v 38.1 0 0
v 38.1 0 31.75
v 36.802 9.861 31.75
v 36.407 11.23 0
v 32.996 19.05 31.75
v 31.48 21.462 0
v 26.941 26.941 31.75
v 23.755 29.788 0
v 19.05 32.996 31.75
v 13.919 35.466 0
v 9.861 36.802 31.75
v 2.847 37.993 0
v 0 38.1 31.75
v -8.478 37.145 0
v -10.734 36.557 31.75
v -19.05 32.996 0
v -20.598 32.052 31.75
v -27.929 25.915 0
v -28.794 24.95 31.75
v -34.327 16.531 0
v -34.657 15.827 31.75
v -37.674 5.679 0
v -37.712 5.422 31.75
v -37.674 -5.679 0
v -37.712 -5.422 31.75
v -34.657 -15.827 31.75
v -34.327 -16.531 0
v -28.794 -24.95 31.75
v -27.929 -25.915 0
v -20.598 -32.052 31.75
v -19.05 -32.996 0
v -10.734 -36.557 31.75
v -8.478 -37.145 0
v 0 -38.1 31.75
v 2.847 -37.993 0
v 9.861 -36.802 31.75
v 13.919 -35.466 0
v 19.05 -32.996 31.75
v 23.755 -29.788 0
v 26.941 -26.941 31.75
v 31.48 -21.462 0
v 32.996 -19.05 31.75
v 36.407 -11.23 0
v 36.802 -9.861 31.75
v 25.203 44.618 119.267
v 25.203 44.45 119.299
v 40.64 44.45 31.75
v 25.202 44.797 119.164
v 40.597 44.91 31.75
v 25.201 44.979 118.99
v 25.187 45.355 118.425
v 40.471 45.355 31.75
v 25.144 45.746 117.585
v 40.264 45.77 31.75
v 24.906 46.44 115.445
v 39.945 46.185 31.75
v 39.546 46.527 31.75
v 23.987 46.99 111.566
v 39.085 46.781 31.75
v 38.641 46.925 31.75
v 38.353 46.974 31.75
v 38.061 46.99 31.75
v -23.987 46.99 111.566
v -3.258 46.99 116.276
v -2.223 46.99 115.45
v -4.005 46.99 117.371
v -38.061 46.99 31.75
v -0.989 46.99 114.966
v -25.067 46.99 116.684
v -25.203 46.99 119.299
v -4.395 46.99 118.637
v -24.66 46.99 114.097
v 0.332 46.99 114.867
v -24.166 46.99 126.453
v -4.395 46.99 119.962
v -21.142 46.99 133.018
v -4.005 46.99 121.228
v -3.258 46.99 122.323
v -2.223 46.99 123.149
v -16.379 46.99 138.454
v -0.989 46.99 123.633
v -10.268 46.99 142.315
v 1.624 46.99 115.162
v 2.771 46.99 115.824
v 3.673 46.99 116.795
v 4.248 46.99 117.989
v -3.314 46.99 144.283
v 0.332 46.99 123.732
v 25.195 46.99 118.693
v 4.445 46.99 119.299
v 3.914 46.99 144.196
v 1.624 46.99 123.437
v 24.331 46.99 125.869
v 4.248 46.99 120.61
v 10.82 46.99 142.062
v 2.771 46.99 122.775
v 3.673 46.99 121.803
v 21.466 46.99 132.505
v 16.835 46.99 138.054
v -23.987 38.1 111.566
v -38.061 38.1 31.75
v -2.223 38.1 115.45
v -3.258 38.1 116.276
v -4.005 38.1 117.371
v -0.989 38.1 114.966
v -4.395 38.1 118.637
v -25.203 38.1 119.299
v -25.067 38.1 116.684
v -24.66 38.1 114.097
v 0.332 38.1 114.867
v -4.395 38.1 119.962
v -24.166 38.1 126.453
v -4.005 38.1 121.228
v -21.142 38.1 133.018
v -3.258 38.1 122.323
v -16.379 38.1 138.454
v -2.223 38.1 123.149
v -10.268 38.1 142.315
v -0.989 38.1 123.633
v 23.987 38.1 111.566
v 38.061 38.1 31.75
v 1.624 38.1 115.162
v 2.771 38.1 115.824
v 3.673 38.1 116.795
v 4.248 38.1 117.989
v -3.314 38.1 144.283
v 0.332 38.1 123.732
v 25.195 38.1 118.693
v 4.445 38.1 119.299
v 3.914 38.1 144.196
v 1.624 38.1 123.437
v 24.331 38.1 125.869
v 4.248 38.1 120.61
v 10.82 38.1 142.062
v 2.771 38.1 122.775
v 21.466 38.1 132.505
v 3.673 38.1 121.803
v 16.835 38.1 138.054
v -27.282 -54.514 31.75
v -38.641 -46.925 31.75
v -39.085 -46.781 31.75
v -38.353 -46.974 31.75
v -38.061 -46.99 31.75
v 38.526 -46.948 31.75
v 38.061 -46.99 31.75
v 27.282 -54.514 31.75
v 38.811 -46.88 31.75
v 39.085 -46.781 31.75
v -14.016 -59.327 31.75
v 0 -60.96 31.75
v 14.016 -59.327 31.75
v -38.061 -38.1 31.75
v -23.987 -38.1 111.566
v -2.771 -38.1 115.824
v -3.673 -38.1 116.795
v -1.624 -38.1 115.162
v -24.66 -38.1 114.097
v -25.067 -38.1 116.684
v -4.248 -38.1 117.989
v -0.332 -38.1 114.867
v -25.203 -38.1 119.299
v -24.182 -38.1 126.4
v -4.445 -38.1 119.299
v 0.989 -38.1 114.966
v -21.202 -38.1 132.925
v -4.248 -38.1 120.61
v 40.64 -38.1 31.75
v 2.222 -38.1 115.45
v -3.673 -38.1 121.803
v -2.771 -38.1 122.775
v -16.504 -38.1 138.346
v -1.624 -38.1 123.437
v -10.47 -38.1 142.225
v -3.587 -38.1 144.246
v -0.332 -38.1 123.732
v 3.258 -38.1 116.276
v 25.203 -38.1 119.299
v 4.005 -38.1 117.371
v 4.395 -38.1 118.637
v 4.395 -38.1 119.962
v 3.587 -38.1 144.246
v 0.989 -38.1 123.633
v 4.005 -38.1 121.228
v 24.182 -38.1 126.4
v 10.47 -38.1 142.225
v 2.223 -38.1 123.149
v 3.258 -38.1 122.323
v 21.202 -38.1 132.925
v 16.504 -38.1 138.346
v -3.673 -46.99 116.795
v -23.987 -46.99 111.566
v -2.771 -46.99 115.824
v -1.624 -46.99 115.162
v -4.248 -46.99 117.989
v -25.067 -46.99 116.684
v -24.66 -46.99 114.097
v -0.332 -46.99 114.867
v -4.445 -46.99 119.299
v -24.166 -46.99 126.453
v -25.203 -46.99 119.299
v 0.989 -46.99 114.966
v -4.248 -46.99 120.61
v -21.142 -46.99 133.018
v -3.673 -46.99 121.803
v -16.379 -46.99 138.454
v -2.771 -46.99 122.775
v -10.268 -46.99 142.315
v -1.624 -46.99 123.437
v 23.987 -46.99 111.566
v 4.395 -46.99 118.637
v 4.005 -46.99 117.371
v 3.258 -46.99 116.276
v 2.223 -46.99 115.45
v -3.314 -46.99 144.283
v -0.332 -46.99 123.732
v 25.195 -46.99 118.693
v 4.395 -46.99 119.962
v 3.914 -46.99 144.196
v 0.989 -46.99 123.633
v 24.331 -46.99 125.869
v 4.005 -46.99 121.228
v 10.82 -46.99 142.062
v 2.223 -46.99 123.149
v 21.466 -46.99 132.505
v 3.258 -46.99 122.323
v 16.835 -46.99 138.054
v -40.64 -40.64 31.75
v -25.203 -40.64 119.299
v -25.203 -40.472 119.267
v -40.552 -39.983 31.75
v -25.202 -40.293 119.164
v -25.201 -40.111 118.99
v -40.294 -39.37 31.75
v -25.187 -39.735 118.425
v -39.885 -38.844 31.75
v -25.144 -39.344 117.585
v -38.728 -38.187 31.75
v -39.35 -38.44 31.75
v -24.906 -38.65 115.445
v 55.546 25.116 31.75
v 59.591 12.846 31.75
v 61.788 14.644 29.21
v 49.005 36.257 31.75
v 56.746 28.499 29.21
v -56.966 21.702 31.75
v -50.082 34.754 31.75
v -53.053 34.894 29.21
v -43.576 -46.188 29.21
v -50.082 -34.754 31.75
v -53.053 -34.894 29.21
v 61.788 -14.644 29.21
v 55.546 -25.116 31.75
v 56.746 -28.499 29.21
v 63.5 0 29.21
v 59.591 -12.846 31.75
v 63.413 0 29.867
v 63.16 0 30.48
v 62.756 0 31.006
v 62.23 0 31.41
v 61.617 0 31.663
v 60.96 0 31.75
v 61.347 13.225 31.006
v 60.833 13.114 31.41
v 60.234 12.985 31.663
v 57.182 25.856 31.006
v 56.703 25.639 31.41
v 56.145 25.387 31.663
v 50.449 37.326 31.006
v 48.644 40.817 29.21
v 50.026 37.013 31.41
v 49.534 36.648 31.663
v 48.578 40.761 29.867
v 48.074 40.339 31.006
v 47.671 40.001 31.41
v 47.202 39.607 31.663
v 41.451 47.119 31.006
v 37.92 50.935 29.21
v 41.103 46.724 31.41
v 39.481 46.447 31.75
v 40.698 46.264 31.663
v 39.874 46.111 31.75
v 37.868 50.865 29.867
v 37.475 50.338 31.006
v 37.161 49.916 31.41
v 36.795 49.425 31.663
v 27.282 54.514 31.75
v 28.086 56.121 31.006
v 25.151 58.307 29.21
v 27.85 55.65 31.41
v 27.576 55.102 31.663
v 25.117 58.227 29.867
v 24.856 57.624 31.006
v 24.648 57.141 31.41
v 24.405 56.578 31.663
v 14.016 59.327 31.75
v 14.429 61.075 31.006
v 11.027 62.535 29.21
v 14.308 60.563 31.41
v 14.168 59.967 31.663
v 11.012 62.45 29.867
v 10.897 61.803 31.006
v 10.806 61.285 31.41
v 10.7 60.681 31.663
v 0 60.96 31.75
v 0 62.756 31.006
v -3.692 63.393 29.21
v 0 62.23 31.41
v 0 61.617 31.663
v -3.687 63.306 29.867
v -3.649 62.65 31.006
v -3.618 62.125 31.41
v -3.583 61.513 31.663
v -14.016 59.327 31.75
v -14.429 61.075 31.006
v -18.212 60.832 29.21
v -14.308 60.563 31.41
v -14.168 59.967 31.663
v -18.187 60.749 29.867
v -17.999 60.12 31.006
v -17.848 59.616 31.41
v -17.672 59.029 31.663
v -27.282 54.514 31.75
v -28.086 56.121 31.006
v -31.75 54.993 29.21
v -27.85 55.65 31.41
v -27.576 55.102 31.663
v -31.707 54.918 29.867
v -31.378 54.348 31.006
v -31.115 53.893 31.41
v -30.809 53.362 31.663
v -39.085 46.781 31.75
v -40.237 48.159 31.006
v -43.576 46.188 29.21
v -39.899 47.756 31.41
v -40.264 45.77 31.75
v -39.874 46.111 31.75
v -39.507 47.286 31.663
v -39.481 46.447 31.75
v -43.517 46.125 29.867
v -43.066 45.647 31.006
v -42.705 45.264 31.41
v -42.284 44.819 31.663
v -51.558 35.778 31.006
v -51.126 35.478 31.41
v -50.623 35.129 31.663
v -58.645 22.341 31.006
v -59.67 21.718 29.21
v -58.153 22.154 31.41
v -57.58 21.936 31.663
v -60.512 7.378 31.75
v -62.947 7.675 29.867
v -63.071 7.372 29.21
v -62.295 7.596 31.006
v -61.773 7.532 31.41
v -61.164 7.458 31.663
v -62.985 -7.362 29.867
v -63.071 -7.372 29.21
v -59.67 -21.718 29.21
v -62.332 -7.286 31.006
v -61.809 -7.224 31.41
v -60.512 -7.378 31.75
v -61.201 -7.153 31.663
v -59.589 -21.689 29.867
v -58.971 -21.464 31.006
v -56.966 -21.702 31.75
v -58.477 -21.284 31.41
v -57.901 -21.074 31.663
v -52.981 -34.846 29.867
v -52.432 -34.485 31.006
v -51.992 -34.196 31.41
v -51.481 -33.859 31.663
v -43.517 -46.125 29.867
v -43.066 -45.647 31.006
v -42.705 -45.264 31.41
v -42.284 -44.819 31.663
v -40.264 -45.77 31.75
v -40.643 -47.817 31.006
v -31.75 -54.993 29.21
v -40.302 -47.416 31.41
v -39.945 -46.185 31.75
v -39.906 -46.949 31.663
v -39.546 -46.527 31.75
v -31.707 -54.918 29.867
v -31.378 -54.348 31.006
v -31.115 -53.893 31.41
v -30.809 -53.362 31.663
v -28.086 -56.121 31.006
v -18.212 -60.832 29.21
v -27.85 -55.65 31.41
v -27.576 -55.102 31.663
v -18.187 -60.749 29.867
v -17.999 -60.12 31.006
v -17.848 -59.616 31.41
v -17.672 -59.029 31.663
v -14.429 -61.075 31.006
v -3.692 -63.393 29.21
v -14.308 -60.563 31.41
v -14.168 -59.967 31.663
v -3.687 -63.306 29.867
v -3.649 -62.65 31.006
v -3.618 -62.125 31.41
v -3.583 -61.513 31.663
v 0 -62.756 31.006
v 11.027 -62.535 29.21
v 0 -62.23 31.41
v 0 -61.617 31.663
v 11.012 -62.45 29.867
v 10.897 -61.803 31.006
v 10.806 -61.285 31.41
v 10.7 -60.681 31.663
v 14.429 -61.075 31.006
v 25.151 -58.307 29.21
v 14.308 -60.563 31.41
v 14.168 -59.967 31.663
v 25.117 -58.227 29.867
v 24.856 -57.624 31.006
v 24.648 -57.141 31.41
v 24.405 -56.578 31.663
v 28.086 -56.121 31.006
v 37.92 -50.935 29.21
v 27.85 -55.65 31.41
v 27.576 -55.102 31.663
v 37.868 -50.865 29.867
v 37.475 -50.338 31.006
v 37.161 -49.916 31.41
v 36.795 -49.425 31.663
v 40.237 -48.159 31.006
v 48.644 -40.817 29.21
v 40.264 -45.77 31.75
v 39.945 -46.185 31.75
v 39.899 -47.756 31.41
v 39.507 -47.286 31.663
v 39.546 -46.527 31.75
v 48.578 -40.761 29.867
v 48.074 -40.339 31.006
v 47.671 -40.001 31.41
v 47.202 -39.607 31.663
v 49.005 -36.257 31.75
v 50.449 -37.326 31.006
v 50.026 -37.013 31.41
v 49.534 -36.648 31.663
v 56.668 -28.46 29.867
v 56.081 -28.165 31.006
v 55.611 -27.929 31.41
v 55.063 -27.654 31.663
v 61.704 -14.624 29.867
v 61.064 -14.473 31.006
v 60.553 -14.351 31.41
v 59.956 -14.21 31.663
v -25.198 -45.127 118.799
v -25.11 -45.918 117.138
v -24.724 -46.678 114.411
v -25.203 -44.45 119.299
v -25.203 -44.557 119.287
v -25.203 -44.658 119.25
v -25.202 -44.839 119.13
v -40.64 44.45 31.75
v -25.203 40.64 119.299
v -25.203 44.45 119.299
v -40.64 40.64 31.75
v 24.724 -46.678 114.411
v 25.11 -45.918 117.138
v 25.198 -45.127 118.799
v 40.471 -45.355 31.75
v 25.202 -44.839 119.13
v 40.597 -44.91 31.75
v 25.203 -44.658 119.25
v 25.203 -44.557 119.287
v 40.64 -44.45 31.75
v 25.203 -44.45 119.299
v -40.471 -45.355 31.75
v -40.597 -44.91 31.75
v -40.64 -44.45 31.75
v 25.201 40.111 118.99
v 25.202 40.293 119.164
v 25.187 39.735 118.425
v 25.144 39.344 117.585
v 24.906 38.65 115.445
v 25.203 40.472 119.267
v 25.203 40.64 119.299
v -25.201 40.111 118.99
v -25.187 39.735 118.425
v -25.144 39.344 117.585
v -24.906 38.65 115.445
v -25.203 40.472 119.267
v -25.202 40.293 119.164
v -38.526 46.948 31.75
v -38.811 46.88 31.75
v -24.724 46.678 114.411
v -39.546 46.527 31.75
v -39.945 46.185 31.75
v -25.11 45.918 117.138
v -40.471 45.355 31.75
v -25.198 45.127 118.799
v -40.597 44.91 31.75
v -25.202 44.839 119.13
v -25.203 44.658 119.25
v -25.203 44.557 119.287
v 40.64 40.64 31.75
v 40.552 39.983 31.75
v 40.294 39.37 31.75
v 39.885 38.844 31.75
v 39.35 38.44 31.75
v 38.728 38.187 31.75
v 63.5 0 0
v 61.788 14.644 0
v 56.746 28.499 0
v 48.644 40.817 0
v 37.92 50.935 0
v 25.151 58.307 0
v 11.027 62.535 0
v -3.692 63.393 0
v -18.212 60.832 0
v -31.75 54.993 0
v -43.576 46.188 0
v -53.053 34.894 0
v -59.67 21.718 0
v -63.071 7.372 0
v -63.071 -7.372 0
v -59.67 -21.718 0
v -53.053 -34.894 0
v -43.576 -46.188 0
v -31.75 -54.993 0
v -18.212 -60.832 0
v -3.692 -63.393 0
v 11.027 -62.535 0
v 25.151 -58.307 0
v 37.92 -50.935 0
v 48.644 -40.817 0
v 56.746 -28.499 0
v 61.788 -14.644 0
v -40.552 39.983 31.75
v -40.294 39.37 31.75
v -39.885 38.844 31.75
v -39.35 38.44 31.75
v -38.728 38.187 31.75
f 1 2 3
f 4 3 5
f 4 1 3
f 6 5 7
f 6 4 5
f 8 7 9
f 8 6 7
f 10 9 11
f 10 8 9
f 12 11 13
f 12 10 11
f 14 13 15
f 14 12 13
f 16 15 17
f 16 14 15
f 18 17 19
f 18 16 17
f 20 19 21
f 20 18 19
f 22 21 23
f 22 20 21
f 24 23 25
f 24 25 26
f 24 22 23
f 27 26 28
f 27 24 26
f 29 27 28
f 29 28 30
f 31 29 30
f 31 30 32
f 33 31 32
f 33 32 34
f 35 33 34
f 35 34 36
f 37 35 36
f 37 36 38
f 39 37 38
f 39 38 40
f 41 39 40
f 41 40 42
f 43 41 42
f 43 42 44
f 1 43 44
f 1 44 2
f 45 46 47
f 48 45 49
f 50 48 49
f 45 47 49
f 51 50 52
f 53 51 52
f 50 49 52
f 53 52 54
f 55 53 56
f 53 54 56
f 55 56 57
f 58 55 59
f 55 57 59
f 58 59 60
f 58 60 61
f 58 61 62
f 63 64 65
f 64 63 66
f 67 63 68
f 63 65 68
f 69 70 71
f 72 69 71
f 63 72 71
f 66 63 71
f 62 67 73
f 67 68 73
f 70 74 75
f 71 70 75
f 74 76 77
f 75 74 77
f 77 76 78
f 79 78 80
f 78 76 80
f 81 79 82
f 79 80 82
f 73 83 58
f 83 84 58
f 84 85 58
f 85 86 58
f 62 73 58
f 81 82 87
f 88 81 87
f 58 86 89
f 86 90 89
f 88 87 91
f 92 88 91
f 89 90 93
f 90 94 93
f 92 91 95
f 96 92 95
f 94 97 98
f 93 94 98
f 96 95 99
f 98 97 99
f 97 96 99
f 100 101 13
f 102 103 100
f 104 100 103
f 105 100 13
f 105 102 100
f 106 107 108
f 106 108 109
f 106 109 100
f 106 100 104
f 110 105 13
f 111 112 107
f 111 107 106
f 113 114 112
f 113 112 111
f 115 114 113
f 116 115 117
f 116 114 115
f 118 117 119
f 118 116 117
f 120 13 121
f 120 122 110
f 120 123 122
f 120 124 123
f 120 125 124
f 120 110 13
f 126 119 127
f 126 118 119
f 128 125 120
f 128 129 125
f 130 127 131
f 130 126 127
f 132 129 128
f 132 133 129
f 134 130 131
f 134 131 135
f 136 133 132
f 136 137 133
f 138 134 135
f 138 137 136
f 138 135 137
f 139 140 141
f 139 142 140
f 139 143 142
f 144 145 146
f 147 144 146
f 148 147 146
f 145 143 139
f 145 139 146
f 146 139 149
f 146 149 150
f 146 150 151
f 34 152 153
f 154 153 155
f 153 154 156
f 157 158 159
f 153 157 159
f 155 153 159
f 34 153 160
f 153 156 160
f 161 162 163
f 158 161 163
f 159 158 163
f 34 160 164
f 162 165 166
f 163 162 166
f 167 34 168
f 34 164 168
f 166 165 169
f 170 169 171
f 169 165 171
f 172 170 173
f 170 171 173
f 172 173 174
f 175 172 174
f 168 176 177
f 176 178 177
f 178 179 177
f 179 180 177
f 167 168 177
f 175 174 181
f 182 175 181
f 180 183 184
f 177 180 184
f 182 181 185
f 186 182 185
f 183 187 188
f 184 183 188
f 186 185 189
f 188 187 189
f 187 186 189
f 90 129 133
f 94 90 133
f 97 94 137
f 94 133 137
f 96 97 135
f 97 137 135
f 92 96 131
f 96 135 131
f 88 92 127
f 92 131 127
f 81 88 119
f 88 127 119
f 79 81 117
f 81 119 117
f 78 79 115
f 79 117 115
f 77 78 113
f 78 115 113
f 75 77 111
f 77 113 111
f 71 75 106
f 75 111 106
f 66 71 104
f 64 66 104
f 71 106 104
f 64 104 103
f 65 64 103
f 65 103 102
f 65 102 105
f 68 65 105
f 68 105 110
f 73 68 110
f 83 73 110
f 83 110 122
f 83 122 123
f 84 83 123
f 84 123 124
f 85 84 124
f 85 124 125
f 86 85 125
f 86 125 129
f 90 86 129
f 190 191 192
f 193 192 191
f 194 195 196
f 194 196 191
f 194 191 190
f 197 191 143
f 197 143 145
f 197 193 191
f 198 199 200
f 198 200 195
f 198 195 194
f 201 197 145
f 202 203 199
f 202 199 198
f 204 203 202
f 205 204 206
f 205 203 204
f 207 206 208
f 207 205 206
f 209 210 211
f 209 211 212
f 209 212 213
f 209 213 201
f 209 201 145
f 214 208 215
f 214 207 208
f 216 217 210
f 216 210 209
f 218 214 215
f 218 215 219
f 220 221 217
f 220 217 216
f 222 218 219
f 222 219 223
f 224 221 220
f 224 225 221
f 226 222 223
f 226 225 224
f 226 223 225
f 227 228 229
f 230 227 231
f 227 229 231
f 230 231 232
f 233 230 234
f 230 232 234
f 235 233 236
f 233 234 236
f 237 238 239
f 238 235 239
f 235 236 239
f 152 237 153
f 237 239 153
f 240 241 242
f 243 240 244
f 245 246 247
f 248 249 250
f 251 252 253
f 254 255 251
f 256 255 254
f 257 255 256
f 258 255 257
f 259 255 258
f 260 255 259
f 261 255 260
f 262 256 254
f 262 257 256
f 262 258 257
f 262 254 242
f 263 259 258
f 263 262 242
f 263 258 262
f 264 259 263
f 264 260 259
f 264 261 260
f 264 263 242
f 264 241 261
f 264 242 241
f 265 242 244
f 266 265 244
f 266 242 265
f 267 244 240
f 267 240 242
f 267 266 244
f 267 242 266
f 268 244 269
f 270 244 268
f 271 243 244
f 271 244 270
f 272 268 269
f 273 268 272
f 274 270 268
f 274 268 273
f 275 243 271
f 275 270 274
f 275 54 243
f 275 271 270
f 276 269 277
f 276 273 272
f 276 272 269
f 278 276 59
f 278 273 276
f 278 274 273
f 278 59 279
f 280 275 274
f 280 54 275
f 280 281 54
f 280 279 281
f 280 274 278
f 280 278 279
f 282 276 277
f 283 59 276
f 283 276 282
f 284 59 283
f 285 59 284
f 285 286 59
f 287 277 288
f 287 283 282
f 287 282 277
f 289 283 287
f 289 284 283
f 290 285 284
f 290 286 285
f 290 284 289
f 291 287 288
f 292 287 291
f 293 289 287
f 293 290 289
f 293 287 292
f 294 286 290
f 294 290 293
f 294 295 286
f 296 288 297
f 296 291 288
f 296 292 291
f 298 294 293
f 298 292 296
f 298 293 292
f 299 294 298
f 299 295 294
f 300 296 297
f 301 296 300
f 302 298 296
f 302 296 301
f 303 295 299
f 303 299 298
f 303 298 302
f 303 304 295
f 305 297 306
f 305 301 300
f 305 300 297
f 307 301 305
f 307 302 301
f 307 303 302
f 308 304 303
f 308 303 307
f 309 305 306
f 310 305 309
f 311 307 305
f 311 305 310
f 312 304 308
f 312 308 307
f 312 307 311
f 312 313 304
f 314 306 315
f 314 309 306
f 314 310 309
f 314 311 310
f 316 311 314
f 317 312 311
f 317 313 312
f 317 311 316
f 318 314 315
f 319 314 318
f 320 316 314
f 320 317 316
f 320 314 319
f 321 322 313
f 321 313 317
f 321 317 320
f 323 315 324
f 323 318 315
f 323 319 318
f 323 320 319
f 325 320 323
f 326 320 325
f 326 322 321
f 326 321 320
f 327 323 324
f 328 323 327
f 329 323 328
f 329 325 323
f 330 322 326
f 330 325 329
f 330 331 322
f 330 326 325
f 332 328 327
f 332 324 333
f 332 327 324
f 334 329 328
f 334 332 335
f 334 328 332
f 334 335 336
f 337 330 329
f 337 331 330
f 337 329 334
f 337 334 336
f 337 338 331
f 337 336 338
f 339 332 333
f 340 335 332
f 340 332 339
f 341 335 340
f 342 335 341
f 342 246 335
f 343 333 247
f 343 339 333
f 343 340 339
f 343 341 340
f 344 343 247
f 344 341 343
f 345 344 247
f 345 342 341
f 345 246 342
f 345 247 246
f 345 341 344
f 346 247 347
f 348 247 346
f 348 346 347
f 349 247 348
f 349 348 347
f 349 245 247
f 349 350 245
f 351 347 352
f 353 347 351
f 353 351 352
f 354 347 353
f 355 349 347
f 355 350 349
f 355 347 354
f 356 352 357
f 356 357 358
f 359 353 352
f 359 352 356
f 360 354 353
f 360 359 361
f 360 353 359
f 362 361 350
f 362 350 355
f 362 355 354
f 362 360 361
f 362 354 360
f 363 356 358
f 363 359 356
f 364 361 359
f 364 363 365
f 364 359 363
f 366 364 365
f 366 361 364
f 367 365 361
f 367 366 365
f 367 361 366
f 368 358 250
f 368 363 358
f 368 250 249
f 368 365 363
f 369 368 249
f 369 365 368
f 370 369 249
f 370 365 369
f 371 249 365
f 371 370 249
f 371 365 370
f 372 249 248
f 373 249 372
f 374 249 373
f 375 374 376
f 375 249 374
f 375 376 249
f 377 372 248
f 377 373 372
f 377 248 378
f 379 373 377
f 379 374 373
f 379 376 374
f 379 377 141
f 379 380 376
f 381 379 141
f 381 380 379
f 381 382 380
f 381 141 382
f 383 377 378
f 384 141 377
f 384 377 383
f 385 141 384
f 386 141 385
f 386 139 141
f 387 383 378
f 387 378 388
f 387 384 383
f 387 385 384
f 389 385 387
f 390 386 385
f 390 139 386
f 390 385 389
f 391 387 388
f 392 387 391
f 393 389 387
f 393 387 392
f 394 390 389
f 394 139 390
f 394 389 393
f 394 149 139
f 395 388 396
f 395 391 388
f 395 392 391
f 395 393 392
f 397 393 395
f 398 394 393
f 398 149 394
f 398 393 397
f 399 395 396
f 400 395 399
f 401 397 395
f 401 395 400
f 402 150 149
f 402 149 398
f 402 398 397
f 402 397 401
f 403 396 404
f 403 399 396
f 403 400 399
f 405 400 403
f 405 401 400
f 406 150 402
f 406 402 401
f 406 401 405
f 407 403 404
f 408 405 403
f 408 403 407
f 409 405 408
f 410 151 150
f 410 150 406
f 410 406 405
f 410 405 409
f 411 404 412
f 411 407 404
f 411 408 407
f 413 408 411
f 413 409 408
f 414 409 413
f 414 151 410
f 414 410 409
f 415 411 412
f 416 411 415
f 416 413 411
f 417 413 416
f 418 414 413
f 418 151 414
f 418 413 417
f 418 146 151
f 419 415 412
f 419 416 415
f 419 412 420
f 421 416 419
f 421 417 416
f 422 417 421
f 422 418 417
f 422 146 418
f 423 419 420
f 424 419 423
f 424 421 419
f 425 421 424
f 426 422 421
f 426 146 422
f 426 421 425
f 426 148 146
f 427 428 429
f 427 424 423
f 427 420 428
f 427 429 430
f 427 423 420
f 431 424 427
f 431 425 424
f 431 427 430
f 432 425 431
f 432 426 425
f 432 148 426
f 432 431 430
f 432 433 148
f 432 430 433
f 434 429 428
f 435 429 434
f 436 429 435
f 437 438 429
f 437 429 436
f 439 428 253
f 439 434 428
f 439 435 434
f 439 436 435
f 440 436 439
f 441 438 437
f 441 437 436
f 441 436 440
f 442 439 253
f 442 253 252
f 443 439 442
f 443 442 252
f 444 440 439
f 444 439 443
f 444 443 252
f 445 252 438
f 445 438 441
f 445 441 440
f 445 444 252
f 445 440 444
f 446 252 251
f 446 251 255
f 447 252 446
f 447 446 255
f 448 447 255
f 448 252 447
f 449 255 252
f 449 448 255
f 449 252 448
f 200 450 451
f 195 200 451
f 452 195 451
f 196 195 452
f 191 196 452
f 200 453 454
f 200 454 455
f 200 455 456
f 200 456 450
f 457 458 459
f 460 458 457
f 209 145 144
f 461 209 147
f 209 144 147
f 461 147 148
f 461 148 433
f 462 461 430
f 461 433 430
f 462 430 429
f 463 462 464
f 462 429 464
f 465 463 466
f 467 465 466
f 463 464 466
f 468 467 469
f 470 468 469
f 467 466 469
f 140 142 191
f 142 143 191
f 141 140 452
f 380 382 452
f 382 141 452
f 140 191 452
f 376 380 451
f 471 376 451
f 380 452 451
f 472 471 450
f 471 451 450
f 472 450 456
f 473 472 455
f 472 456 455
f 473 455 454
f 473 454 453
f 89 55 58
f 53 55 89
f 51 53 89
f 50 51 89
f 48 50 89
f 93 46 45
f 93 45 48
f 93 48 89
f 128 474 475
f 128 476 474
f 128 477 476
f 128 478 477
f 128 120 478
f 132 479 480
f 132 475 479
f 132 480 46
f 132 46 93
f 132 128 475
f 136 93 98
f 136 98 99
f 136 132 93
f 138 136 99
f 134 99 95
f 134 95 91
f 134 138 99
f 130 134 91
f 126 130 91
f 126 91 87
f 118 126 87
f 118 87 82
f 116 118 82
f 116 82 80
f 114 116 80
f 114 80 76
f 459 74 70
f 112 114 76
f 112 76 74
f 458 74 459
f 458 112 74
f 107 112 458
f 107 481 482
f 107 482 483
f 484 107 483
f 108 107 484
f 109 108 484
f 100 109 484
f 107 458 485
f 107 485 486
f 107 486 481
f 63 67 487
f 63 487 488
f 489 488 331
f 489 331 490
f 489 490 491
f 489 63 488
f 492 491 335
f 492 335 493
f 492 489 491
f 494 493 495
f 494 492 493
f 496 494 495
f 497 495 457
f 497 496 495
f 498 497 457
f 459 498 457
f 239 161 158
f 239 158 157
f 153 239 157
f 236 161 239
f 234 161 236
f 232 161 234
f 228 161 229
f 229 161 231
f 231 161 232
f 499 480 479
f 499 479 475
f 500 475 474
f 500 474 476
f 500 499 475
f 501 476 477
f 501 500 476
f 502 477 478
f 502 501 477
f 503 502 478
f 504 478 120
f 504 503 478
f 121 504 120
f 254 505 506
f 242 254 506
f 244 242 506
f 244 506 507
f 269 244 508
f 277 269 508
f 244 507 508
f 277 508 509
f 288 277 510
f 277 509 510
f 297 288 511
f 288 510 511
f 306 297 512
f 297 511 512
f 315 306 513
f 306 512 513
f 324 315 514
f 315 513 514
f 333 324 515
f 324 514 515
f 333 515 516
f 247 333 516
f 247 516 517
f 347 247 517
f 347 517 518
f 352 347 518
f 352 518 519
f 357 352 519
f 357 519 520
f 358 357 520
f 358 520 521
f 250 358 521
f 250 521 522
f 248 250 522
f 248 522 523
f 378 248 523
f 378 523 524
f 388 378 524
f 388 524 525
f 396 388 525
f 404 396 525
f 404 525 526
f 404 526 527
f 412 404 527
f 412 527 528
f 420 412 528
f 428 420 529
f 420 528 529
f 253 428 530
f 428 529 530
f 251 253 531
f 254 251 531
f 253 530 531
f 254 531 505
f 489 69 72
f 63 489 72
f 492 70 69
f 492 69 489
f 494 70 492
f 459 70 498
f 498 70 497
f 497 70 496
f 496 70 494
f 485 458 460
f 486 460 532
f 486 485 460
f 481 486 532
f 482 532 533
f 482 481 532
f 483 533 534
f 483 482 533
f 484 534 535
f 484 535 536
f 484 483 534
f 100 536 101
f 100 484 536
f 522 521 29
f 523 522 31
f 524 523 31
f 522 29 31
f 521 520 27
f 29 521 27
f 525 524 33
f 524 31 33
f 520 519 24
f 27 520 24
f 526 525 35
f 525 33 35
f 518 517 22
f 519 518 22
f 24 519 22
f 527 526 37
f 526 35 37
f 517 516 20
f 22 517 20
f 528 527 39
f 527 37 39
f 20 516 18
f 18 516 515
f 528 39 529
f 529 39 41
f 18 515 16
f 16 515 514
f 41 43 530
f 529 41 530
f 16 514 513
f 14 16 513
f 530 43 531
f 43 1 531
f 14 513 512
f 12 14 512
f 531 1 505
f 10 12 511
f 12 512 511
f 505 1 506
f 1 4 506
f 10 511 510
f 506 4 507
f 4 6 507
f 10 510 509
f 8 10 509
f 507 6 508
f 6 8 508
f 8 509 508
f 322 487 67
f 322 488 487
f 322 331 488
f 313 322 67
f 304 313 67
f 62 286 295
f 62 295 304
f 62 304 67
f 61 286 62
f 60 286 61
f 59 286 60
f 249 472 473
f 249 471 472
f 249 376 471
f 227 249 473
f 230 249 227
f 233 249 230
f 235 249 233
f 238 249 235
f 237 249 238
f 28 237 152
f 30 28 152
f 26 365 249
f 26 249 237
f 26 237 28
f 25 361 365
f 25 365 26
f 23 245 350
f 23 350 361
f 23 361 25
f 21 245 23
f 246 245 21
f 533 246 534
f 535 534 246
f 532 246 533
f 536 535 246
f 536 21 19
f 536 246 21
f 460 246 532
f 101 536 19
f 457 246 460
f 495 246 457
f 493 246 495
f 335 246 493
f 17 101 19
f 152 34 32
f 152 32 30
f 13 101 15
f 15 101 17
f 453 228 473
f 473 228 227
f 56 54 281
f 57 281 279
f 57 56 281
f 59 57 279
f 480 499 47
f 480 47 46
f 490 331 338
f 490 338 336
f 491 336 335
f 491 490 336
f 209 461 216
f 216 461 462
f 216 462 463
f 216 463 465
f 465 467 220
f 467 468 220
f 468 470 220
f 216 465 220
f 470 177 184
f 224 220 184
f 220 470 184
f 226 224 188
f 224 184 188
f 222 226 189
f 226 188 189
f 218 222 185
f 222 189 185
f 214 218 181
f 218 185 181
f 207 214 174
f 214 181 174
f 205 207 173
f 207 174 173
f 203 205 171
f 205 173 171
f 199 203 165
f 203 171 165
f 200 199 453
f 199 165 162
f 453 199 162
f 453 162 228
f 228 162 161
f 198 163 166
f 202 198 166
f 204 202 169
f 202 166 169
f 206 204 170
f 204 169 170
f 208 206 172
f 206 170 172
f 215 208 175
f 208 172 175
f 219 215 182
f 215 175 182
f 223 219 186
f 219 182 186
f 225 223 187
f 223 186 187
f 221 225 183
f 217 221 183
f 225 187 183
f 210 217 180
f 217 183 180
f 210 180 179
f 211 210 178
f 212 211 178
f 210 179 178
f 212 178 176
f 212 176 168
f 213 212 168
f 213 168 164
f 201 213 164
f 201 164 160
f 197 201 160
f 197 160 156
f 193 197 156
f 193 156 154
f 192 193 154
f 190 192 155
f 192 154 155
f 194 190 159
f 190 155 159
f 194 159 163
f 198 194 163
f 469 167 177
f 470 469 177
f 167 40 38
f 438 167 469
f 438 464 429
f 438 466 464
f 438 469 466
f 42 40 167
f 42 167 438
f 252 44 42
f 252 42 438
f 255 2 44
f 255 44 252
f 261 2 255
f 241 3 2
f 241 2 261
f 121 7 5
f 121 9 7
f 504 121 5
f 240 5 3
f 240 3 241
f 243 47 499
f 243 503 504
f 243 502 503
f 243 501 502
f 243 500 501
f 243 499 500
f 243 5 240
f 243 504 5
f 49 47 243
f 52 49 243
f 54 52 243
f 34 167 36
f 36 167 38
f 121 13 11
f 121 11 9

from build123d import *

# Parameters (mm, degrees)
F0_R          = 63.5
F0_R_2        = 38.1
F1_DEPTH      = 31.75
F4_DEPTH      = 8.89
F9_D          = 8.89
F11_DEPTH     = 8.89
F13_D         = 8.89
F14_T4_DEPTH  = 114.3
F14_S6_R      = 25.2026770054
F14_T7_DEPTH  = 59
F14_T11_DEPTH = 114.3
F14_S13_R     = 25.2026770054
F14_T14_DEPTH = 59
F14_T18_DEPTH = 114.3
F14_S20_R     = 25.2026770054
F14_T21_DEPTH = 59
F14_T25_DEPTH = 114.3
F14_S27_R     = 25.2026770054
F14_T28_DEPTH = 59
F14_T32_DEPTH = 114.3
F14_S34_R     = 25.2026770054
F14_T35_DEPTH = 59
F14_T39_DEPTH = 114.3
F14_S41_R     = 25.2026770054
F14_T42_DEPTH = 59
F14_T46_DEPTH = 114.3
F14_S48_R     = 25.2026770054
F14_T49_DEPTH = 59
F14_S54_R     = 2.54
F14_T55_DEPTH = 99
F14_S56_R     = 2.54
F14_T57_DEPTH = 99


# Not quite as in the source:
# - a fillet or chamfer that OpenCascade refuses, or shapes differently, is made with other operations: its cross-section is extruded or revolved along the edge and cut away or added
# - a feature of the source that left no trace in its solid (it failed there, or was rolled back) is left out


with BuildPart() as f1:
    # F0 (on Top) → F1 (new body)
    with BuildSketch(Plane.XY):
        Circle(F0_R)
        Circle(F0_R_2, mode=Mode.SUBTRACT)
    extrude(amount=F1_DEPTH)

    # F3 (on offset) → F4 (join)
    with BuildSketch(Plane.XZ.offset(38.1)):
        with BuildLine():
            Line((-25.2026770054, 119.2994092428), (-40.64, 31.75))
            Line((-40.64, 31.75), (40.64, 31.75))
            Line((40.64, 31.75), (25.2026770054, 119.2994092428))
            ThreePointArc((25.2026770054, 119.2994092428), (0, 144.5020862482), (-25.2026770054, 119.2994092428))
        make_face()
    extrude(amount=F4_DEPTH)

    # F9 (through all)
    with Locations(Plane.XZ.offset(46.99)):
        with Locations((0, 119.2994092428)):
            Hole(F9_D / 2)

    # F6 (on offset) → F11 (join)
    with BuildSketch(Plane.XZ.offset(-38.1)):
        with BuildLine():
            Line((-25.2026770054, 119.2994092428), (-40.64, 31.75))
            Line((-40.64, 31.75), (40.64, 31.75))
            Line((40.64, 31.75), (25.2026770054, 119.2994092428))
            ThreePointArc((25.2026770054, 119.2994092428), (0, 144.5020862482), (-25.2026770054, 119.2994092428))
        make_face()
    extrude(amount=-F11_DEPTH)

    # F13 (through all)
    with Locations(Plane(origin=(0, 46.99, 0), x_dir=(-1, 0, 0), z_dir=(0, 1, 0))):
        with Locations((0, 119.2994092428)):
            Hole(F13_D / 2)

    # F14: fillet of radius 2.54 on 8 edges, made by hand


with BuildPart() as f14_tool2:
    # F14_s3 → F14_t4 (new body)
    with BuildSketch(Plane(origin=(22.9494446088, 0, 130.1527679803), x_dir=(0, 1, 0), z_dir=(-0.1736481777, 0, -0.984807753))):
        with BuildLine():
            ThreePointArc((-46.99, -42.9959167233), (-46.2460512242, -44.7919679476), (-44.45, -45.5359167233))
            Line((-44.45, -45.5359167233), (-46.99, -45.5359167233))
            Line((-46.99, -45.5359167233), (-46.99, -42.9959167233))
        make_face()
    extrude(amount=F14_T4_DEPTH)

    split(bisect_by=Plane.XY.offset(31.75), keep=Keep.TOP)

    # F14_s6 → F14_t7 (cut, symmetric)
    with BuildSketch(Plane.XZ.offset(45.7)):
        with Locations((0, 119.2994092428)):
            Circle(F14_S6_R)
    extrude(amount=F14_T7_DEPTH, both=True, mode=Mode.SUBTRACT)


with BuildPart() as f1_1:
    add(f1.part)

    # F14_t1: cut F14_tool2
    add(f14_tool2.part, mode=Mode.SUBTRACT)


with BuildPart() as f14_tool9:
    # F14_s10 → F14_t11 (new body)
    with BuildSketch(Plane(origin=(-3.1014579015, 0, 17.589241811), x_dir=(0, 1, 0), z_dir=(-0.1736481777, 0, 0.984807753))):
        with BuildLine():
            ThreePointArc((-46.99, -42.9959167233), (-46.2460512242, -44.7919679476), (-44.45, -45.5359167233))
            Line((-44.45, -45.5359167233), (-46.99, -45.5359167233))
            Line((-46.99, -45.5359167233), (-46.99, -42.9959167233))
        make_face()
    extrude(amount=F14_T11_DEPTH)

    split(bisect_by=Plane.XY.offset(31.75), keep=Keep.TOP)

    # F14_s13 → F14_t14 (cut, symmetric)
    with BuildSketch(Plane.XZ.offset(45.7)):
        with Locations((0, 119.2994092428)):
            Circle(F14_S13_R)
    extrude(amount=F14_T14_DEPTH, both=True, mode=Mode.SUBTRACT)


with BuildPart() as f1_2:
    add(f1_1.part)

    # F14_t8: cut F14_tool9
    add(f14_tool9.part, mode=Mode.SUBTRACT)


with BuildPart() as f14_tool16:
    # F14_s17 → F14_t18 (new body)
    with BuildSketch(Plane(origin=(22.9494446088, 0, 130.1527679803), x_dir=(0, 1, 0), z_dir=(-0.1736481777, 0, -0.984807753))):
        with BuildLine():
            ThreePointArc((-40.64, -45.5359167233), (-38.8439487758, -44.7919679476), (-38.1, -42.9959167233))
            Line((-38.1, -42.9959167233), (-38.1, -45.5359167233))
            Line((-38.1, -45.5359167233), (-40.64, -45.5359167233))
        make_face()
    extrude(amount=F14_T18_DEPTH)

    split(bisect_by=Plane.XY.offset(31.75), keep=Keep.TOP)

    # F14_s20 → F14_t21 (cut, symmetric)
    with BuildSketch(Plane.XZ.offset(39.4)):
        with Locations((0, 119.2994092428)):
            Circle(F14_S20_R)
    extrude(amount=F14_T21_DEPTH, both=True, mode=Mode.SUBTRACT)


with BuildPart() as f1_3:
    add(f1_2.part)

    # F14_t15: cut F14_tool16
    add(f14_tool16.part, mode=Mode.SUBTRACT)


with BuildPart() as f14_tool23:
    # F14_s24 → F14_t25 (new body)
    with BuildSketch(Plane(origin=(-3.1014579015, 0, 17.589241811), x_dir=(0, 1, 0), z_dir=(-0.1736481777, 0, 0.984807753))):
        with BuildLine():
            ThreePointArc((40.64, -45.5359167233), (38.8439487758, -44.7919679476), (38.1, -42.9959167233))
            Line((38.1, -42.9959167233), (38.1, -45.5359167233))
            Line((38.1, -45.5359167233), (40.64, -45.5359167233))
        make_face()
    extrude(amount=F14_T25_DEPTH)

    split(bisect_by=Plane.XY.offset(31.75), keep=Keep.TOP)

    # F14_s27 → F14_t28 (cut, symmetric)
    with BuildSketch(Plane.XZ.offset(-39.4)):
        with Locations((0, 119.2994092428)):
            Circle(F14_S27_R)
    extrude(amount=F14_T28_DEPTH, both=True, mode=Mode.SUBTRACT)


with BuildPart() as f1_4:
    add(f1_3.part)

    # F14_t22: cut F14_tool23
    add(f14_tool23.part, mode=Mode.SUBTRACT)


with BuildPart() as f14_tool30:
    # F14_s31 → F14_t32 (new body)
    with BuildSketch(Plane(origin=(-3.1014579015, 0, 17.589241811), x_dir=(0, 1, 0), z_dir=(-0.1736481777, 0, 0.984807753))):
        with BuildLine():
            ThreePointArc((44.45, -45.5359167233), (46.2460512242, -44.7919679476), (46.99, -42.9959167233))
            Line((46.99, -42.9959167233), (46.99, -45.5359167233))
            Line((46.99, -45.5359167233), (44.45, -45.5359167233))
        make_face()
    extrude(amount=F14_T32_DEPTH)

    split(bisect_by=Plane.XY.offset(31.75), keep=Keep.TOP)

    # F14_s34 → F14_t35 (cut, symmetric)
    with BuildSketch(Plane.XZ.offset(-45.7)):
        with Locations((0, 119.2994092428)):
            Circle(F14_S34_R)
    extrude(amount=F14_T35_DEPTH, both=True, mode=Mode.SUBTRACT)


with BuildPart() as f1_5:
    add(f1_4.part)

    # F14_t29: cut F14_tool30
    add(f14_tool30.part, mode=Mode.SUBTRACT)


with BuildPart() as f14_tool37:
    # F14_s38 → F14_t39 (new body)
    with BuildSketch(Plane(origin=(22.9494446088, 0, 130.1527679803), x_dir=(0, 1, 0), z_dir=(-0.1736481777, 0, -0.984807753))):
        with BuildLine():
            ThreePointArc((46.99, -42.9959167233), (46.2460512242, -44.7919679476), (44.45, -45.5359167233))
            Line((44.45, -45.5359167233), (46.99, -45.5359167233))
            Line((46.99, -45.5359167233), (46.99, -42.9959167233))
        make_face()
    extrude(amount=F14_T39_DEPTH)

    split(bisect_by=Plane.XY.offset(31.75), keep=Keep.TOP)

    # F14_s41 → F14_t42 (cut, symmetric)
    with BuildSketch(Plane.XZ.offset(-45.7)):
        with Locations((0, 119.2994092428)):
            Circle(F14_S41_R)
    extrude(amount=F14_T42_DEPTH, both=True, mode=Mode.SUBTRACT)


with BuildPart() as f1_6:
    add(f1_5.part)

    # F14_t36: cut F14_tool37
    add(f14_tool37.part, mode=Mode.SUBTRACT)


with BuildPart() as f14_tool44:
    # F14_s45 → F14_t46 (new body)
    with BuildSketch(Plane(origin=(22.9494446088, 0, 130.1527679803), x_dir=(0, 1, 0), z_dir=(-0.1736481777, 0, -0.984807753))):
        with BuildLine():
            ThreePointArc((40.64, -45.5359167233), (38.8439487758, -44.7919679476), (38.1, -42.9959167233))
            Line((38.1, -42.9959167233), (38.1, -45.5359167233))
            Line((38.1, -45.5359167233), (40.64, -45.5359167233))
        make_face()
    extrude(amount=F14_T46_DEPTH)

    split(bisect_by=Plane.XY.offset(31.75), keep=Keep.TOP)

    # F14_s48 → F14_t49 (cut, symmetric)
    with BuildSketch(Plane.XZ.offset(-39.4)):
        with Locations((0, 119.2994092428)):
            Circle(F14_S48_R)
    extrude(amount=F14_T49_DEPTH, both=True, mode=Mode.SUBTRACT)


with BuildPart() as f1_7:
    add(f1_6.part)

    # F14_t43: cut F14_tool44
    add(f14_tool44.part, mode=Mode.SUBTRACT)


with BuildPart() as f14_tool51:
    # F14_s52 → F14_t53 (revolve)
    with BuildSketch(Plane.XZ):
        with BuildLine():
            ThreePointArc((63.5, 29.21), (62.7560512242, 31.0060512242), (60.96, 31.75))
            Line((60.96, 31.75), (63.5, 31.75))
            Line((63.5, 31.75), (63.5, 29.21))
        make_face()
    revolve(axis=Axis((0, 0, 31.75), (0, 0, 1)))

    # F14_s54 → F14_t55 (cut, symmetric)
    with BuildSketch(Plane(origin=(5.20944533, 0, 29.5442325904), x_dir=(0, 1, 0), z_dir=(0.1736481777, 0, 0.984807753))):
        with Locations((-44.45, 42.9959167233)):
            Circle(F14_S54_R)
    extrude(amount=F14_T55_DEPTH, both=True, mode=Mode.SUBTRACT)

    # F14_s56 → F14_t57 (cut, symmetric)
    with BuildSketch(Plane(origin=(-5.20944533, 0, 29.5442325904), x_dir=(0, 1, 0), z_dir=(0.1736481777, 0, -0.984807753))):
        with Locations((-44.45, 42.9959167233)):
            Circle(F14_S56_R)
    extrude(amount=F14_T57_DEPTH, both=True, mode=Mode.SUBTRACT)


with BuildPart() as f1_8:
    add(f1_7.part)

    # F14_t50: cut F14_tool51
    add(f14_tool51.part, mode=Mode.SUBTRACT)


solid = f1_8.part
